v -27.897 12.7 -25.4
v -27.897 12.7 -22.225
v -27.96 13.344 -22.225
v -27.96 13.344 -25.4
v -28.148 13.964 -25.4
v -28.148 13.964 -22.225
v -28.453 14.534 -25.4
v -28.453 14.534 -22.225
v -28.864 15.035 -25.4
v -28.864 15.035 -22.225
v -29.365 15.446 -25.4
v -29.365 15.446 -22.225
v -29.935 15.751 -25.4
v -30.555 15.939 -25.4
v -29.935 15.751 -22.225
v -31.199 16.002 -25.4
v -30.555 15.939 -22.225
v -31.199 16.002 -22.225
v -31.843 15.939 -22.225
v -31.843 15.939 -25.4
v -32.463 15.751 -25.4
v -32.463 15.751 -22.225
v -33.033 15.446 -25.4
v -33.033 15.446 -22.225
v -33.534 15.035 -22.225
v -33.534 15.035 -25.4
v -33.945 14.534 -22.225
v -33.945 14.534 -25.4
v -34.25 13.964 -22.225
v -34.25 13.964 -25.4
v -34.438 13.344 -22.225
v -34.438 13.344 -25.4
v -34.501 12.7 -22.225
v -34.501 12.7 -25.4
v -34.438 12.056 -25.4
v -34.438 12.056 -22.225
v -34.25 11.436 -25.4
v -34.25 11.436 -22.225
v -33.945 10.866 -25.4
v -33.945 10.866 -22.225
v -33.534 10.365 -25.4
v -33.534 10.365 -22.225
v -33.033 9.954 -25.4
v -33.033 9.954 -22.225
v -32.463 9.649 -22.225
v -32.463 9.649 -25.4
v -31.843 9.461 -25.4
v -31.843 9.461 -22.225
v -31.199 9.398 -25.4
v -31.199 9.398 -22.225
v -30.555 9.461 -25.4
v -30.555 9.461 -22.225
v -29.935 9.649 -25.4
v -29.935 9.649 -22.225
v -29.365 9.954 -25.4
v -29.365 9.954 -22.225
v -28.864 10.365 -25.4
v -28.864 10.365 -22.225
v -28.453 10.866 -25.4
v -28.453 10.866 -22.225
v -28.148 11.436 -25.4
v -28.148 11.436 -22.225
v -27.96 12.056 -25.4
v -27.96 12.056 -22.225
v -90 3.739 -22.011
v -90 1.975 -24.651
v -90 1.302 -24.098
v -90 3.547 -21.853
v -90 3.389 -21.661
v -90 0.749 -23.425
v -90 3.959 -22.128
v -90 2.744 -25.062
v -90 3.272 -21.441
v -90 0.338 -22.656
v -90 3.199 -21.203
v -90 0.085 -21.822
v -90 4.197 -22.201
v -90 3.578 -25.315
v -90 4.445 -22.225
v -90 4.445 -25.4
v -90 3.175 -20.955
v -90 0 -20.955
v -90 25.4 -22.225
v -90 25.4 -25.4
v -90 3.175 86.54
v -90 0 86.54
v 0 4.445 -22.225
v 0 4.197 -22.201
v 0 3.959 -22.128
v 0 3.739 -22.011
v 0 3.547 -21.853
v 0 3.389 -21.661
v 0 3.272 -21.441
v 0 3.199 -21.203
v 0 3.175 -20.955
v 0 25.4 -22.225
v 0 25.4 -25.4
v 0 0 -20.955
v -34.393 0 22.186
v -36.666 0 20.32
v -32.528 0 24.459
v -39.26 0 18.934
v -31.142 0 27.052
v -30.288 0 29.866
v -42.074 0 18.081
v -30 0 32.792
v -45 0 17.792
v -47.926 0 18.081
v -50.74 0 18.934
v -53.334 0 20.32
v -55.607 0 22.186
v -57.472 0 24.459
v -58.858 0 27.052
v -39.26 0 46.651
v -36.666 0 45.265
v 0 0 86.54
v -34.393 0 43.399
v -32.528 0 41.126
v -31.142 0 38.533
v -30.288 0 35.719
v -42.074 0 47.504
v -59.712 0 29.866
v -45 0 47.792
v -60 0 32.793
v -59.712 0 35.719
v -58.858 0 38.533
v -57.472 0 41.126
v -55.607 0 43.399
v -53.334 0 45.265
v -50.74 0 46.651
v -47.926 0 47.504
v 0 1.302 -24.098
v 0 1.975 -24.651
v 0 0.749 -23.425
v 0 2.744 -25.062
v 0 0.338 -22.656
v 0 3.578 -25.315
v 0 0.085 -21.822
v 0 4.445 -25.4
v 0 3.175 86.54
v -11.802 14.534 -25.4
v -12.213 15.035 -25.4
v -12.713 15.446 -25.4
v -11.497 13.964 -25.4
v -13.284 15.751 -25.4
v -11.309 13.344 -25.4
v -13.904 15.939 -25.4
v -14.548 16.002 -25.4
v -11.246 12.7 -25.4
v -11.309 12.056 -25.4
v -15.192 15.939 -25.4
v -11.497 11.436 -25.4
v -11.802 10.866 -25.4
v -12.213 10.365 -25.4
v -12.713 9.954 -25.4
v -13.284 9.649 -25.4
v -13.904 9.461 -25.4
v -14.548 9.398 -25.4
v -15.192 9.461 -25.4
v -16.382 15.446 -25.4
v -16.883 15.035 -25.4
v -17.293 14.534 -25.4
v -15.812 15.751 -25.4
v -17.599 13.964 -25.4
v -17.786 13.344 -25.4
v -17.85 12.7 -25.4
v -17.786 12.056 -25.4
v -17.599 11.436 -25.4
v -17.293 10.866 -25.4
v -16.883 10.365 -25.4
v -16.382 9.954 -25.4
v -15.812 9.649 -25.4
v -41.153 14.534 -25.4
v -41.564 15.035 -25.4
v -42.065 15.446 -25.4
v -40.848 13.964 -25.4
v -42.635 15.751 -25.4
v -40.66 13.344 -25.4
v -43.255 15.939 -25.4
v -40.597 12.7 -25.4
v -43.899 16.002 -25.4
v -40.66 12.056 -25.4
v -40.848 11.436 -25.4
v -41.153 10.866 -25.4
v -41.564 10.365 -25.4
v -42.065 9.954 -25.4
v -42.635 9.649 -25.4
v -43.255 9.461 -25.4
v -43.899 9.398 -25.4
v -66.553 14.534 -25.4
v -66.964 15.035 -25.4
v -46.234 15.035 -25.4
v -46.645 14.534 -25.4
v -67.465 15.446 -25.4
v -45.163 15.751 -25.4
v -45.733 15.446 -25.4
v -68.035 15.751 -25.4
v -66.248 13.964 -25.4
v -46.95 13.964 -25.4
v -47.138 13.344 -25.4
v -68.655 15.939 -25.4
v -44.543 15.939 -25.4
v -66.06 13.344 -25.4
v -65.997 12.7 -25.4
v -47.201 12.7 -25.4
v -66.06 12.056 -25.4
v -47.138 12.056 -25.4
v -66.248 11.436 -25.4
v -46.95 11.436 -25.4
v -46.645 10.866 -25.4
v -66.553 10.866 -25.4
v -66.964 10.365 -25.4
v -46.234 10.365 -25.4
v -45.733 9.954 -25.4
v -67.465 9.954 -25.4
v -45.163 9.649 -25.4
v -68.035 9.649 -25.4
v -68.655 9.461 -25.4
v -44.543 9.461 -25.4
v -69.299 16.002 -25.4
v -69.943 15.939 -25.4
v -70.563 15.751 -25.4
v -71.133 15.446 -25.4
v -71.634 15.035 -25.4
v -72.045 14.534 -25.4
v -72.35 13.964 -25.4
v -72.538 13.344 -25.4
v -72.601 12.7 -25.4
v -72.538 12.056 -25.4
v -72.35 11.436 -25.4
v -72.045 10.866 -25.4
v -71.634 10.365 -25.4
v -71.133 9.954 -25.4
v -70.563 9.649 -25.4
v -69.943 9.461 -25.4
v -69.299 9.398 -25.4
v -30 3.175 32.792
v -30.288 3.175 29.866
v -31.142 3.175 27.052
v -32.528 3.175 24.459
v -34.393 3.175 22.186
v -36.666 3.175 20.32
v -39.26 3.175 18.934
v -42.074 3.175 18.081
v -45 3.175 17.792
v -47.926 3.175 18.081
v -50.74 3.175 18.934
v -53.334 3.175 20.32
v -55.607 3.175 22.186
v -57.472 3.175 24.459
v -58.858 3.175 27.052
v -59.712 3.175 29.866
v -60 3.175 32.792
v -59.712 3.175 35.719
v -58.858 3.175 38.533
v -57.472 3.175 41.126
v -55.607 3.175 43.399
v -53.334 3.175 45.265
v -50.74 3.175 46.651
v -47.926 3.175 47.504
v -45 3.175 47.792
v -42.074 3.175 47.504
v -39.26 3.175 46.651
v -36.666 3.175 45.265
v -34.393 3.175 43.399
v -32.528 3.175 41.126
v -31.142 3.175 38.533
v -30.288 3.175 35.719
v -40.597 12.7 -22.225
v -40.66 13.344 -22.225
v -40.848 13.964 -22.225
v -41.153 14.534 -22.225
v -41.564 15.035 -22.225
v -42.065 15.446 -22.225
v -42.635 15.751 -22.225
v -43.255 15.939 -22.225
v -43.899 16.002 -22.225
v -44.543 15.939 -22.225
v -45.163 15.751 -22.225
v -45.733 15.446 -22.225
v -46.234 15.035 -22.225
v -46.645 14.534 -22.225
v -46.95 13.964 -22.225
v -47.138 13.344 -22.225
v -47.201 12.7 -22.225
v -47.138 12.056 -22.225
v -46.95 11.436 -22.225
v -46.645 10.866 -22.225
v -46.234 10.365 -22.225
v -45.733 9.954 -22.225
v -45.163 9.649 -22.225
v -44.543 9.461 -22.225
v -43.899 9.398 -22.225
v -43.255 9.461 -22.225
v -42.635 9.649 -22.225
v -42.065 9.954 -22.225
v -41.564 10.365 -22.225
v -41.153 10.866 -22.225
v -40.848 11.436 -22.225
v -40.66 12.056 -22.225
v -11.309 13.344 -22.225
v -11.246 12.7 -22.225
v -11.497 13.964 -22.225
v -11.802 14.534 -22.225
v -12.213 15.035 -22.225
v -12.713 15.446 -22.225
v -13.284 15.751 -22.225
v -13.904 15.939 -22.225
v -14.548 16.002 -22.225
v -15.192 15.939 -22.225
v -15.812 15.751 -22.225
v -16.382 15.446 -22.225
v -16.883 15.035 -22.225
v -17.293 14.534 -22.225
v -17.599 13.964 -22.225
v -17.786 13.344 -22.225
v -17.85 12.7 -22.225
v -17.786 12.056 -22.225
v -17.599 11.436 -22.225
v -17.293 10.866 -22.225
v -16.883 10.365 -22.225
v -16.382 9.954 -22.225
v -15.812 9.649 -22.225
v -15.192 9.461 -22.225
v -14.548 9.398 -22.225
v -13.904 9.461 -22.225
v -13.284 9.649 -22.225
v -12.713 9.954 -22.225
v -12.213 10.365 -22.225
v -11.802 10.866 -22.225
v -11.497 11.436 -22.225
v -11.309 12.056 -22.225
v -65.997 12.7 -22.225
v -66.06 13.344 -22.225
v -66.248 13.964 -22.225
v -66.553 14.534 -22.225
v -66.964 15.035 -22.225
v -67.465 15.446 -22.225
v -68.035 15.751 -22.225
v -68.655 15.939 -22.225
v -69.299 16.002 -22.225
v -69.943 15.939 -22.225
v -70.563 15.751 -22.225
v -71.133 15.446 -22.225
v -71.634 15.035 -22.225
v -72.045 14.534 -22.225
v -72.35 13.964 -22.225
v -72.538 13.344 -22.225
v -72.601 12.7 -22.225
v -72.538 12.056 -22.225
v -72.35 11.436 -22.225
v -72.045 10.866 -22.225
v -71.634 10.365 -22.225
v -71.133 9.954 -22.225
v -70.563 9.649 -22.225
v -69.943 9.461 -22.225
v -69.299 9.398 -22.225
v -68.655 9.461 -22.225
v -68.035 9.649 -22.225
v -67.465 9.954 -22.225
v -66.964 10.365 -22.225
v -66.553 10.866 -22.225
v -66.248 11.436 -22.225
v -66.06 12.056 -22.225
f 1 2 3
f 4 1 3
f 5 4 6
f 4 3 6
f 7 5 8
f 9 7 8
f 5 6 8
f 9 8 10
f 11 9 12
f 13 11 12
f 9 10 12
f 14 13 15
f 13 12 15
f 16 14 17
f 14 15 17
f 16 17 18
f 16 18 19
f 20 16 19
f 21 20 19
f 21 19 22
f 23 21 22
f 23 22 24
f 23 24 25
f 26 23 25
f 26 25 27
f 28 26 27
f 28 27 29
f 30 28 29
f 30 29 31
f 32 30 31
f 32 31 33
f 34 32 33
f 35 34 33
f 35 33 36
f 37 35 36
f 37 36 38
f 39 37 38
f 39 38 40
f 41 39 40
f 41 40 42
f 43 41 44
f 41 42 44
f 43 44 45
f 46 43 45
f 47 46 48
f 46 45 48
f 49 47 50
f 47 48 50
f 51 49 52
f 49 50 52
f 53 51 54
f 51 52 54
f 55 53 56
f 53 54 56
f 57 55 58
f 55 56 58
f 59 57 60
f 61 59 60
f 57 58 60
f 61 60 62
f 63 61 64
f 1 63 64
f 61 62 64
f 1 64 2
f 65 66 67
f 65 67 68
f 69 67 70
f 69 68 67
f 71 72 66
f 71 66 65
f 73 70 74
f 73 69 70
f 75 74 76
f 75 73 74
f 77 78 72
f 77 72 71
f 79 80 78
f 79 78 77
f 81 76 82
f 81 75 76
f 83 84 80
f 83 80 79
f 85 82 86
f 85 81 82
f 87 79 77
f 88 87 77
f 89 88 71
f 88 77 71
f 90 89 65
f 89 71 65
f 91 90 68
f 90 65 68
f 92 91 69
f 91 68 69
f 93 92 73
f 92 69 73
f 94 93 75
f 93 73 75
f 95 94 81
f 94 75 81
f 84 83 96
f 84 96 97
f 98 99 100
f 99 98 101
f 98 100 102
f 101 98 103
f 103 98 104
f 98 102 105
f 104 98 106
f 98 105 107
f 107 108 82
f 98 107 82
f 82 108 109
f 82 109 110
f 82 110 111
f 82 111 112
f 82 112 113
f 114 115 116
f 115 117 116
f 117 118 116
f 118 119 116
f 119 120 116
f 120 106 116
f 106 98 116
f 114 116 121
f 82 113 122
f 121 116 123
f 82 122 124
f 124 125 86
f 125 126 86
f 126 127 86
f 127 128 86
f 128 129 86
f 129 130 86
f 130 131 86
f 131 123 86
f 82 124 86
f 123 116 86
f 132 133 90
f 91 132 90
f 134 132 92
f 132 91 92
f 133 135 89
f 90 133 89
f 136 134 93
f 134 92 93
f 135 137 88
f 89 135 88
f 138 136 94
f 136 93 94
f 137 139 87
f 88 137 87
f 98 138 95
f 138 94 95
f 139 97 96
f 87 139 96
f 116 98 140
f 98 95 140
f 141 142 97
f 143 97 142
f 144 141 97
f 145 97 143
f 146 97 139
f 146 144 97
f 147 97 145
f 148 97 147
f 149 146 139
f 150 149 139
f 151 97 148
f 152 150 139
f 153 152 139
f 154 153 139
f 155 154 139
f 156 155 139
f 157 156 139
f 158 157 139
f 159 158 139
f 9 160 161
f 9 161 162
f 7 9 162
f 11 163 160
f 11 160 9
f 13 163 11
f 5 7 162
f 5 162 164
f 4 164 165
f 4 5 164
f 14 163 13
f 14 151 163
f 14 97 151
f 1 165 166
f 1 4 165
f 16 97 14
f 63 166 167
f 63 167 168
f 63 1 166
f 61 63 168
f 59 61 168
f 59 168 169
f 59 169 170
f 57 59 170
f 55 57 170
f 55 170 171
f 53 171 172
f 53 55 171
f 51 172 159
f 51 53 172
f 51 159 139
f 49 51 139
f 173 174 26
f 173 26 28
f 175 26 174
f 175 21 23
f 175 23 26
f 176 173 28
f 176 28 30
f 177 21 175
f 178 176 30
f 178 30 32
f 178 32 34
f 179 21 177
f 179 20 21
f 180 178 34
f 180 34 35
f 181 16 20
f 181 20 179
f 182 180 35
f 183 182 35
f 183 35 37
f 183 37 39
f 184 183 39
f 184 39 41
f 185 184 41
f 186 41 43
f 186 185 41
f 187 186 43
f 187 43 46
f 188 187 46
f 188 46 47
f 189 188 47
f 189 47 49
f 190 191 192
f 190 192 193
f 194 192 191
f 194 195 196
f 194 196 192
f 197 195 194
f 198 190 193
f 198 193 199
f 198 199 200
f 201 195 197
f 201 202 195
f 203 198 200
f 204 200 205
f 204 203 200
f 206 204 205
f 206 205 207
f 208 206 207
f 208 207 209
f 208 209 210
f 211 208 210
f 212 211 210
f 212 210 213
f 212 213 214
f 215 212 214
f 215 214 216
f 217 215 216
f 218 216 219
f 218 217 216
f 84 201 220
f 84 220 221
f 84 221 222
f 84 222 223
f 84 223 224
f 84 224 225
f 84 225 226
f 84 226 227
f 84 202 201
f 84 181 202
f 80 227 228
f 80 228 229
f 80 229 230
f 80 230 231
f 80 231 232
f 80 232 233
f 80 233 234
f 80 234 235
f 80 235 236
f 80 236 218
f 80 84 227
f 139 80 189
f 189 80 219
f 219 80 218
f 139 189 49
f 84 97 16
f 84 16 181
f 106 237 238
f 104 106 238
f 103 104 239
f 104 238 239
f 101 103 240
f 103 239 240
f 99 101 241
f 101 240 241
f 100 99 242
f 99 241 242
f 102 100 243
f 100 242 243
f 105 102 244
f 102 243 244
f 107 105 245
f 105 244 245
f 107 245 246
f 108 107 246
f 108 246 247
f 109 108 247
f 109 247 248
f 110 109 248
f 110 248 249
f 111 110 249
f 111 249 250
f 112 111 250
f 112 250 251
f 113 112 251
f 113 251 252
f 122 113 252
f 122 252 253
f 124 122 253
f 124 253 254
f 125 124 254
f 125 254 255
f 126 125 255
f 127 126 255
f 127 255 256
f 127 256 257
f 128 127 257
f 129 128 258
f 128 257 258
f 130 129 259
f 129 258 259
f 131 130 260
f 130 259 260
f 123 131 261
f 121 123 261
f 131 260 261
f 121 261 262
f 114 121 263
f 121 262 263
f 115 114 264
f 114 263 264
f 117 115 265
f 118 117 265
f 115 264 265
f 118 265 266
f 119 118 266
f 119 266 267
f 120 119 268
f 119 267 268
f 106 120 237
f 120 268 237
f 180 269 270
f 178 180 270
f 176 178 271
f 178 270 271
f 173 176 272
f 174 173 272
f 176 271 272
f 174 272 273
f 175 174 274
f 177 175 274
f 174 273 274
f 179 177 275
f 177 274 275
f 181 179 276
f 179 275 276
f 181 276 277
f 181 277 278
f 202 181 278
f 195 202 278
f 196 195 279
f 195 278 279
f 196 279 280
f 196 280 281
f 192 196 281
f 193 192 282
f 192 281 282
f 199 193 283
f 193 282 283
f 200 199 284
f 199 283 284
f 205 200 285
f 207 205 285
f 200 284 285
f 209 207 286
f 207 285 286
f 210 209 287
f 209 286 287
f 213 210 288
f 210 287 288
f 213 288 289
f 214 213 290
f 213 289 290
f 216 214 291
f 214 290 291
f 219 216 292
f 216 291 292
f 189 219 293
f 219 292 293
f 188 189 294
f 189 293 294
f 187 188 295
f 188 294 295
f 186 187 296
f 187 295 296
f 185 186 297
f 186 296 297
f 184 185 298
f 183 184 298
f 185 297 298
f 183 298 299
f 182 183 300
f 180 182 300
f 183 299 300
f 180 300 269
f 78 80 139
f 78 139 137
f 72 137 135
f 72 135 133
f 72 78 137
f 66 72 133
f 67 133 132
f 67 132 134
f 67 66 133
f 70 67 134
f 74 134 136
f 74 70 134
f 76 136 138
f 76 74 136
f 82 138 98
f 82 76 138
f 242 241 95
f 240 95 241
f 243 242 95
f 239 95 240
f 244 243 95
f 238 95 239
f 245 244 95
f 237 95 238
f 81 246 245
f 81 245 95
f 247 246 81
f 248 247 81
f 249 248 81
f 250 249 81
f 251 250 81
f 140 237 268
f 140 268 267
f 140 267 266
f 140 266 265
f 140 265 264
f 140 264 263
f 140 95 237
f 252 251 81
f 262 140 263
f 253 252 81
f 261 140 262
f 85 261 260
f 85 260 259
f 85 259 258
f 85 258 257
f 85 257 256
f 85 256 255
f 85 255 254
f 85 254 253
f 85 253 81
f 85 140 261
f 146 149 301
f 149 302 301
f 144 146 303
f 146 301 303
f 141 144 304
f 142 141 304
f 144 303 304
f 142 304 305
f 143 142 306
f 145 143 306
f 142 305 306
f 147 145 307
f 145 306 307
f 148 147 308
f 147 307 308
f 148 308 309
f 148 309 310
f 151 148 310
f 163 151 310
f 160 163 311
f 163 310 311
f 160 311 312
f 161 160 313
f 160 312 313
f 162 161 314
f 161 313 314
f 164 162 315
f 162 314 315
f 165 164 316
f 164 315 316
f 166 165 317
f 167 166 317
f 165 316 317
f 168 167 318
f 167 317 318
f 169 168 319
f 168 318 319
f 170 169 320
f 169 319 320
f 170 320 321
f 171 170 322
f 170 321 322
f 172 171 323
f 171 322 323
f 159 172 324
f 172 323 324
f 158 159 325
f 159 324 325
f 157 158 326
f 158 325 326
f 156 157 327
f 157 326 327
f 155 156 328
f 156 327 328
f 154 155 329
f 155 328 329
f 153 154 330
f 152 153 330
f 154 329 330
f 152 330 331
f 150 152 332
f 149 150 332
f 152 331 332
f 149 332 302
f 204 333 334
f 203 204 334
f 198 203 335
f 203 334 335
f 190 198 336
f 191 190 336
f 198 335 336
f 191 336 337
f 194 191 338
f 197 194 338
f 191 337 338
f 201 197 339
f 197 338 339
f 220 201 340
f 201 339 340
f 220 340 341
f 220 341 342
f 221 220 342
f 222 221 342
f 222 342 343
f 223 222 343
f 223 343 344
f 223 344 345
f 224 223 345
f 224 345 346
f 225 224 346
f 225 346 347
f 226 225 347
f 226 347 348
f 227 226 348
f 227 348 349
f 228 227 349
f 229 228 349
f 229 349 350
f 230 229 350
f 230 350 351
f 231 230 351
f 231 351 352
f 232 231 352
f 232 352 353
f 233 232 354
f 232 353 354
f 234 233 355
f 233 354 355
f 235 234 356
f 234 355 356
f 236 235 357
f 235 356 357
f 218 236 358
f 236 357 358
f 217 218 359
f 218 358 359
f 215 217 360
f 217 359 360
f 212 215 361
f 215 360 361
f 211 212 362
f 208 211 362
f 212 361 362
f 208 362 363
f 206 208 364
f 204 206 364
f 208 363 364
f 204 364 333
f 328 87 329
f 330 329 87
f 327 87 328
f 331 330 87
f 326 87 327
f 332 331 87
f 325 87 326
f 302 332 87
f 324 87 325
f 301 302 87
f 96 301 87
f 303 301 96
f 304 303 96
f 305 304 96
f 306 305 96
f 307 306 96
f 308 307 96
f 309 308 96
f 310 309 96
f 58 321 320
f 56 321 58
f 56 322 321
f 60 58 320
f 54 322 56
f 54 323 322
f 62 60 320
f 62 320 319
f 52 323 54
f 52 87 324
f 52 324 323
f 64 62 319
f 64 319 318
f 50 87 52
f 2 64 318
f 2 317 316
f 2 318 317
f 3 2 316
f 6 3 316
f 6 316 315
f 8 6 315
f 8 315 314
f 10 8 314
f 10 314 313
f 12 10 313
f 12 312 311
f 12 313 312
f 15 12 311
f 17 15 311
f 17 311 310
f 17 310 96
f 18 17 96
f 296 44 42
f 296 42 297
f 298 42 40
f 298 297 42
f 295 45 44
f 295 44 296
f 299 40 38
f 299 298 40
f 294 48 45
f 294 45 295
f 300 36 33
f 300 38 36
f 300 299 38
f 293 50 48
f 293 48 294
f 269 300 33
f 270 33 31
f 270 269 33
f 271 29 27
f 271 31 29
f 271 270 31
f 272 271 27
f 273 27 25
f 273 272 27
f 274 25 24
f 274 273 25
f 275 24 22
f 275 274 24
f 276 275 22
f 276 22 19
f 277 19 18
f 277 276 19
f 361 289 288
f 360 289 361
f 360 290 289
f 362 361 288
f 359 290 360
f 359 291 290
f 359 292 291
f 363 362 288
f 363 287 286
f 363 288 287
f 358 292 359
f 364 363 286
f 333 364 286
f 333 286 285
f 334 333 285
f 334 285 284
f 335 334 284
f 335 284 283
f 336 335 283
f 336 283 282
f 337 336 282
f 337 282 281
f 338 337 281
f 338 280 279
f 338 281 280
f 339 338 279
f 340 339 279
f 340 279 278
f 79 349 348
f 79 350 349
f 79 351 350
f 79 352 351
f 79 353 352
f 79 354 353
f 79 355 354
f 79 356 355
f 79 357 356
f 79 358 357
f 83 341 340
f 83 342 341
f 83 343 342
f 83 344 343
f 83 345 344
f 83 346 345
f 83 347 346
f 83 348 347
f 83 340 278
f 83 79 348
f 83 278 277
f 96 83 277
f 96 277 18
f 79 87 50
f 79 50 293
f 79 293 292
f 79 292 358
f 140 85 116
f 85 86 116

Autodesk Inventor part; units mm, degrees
ref_plane "YZ Plane" through (0, 0, 0) normal (1, 0, 0) x (0, 1, 0)
ref_plane "XZ Plane" through (0, 0, 0) normal (0, 1, 0) x (-1, 0, 0)
ref_plane "XY Plane" through (0, 0, 0) normal (0, 0, 1) x (1, 0, 0)
sketch "Sketch3" plane through (0, 0, 0) normal (0, 1, 0) x (-1, 0, 0)
  line L0 (0, 0) -> (90, 0)
  line L1 (90, 0) -> (90, 86.54)
  line L2 (90, 86.54) -> (0, 86.54)
  line L3 (0, 86.54) -> (0, 0)
  line L4 (0, 0) -> (0, -25.4)
  line L5 (0, -25.4) -> (90, -25.4)
  line L6 (90, -25.4) -> (90, 0)
  dimension "d13" = 90
  dimension "d14" = 86.54
  dimension "d15" = 25.4
extrude "Plate3" add sketch "Sketch3" along normal blind 3.175
sketch "Sketch4" plane through (-90, 0, -22.225) normal (0, 0, -1) x (-1, 0, 0)
  line L0 (-90, 0) -> (0, 0)
  line L1 (0, 0) -> (0, 25.4)
  line L2 (0, 25.4) -> (-90, 25.4)
  line L3 (-90, 25.4) -> (-90, 0)
edge flange "Flange2" height 25.4 angle 90 thickness 3.175 bend radius 1.27 thickness toward (0, 0, -1) relief tear relief width 3.175 relief depth 1.5875 edges at (-45, 3.175, -25.4) wall of the first edge with corners at (0, 0, -22.225) (-90, 0, -22.225) (-90, 25.4, -22.225) (0, 25.4, -22.225)
bend "Bend2"
corner "Corner2"
sketch "Sketch5" plane through (0, 3.175, 0) normal (0, 1, 0) x (1, 0, 0)
  line L0 (0, 20.955) -> (-90, 20.955) projected
  line L1 (-90, -86.54) -> (-90, 20.955) projected
  line L2 (0, -86.54) -> (-90, -86.54) projected
  line L3 (0, 20.955) -> (0, -86.54) projected
  line L4 (-45, 20.955) -> (-45, -86.54)
  line L5 (0, -32.7925) -> (-90, -32.7925)
  circle A0 centre (-45, -32.7925) radius 15
  point P0 (0, 0)
  dimension "d27" = 30
extrude "Cut1" cut sketch "Sketch5" against normal blind 3.175 contours A0 L5 L4 | L4 L5 A0 | A0 L4 L5 | L4 A0 L5
sketch "Sketch6" plane through (-90, 25.4, -22.225) normal (0, 0, 1) x (1, 0, 0)
  circle A0 centre (20.701, -12.7) radius 3.302 projected
  circle A1 centre (58.801, -12.7) radius 3.302 projected
  circle A2 centre (46.101, -12.7) radius 3.302 projected
  circle A3 centre (1.651, -12.7) radius 3.302 projected
  circle A4 centre (119.9021, -12.7) radius 3.302 projected
  circle A5 centre (75.4521, -12.7) radius 3.302 projected
  point P0 (90, -25.4)
extrude "Cut2" cut sketch "Sketch6" against normal blind 3.175 contours A0 | A1 | A2 | A5
equation "\"d28\" = Thickness"
equation "\"d30\" = Thickness"
equation "\"d17\" = BendReliefWidth"
equation "\"d18\" = BendReliefDepth"
equation "\"d19\" = MinimumRemnant"
equation "\"d20\" = BendRadius"
equation "\"d24\" = CornerReliefSize"
equation "\"d25\" = GapSize"
equation "\"d26\" = JacobiRadiusSize"
equation "\"BendRadius\" = Thickness"
equation "\"BendReliefWidth\" = Thickness"
equation "\"BendReliefDepth\" = 0.5 * Thickness"
equation "\"CornerReliefSize\" = 4 * Thickness"
equation "\"MinimumRemnant\" = 2 * Thickness"
equation "\"TransitionRadius\" = BendRadius"
equation "\"JacobiRadiusSize\" = BendRadius"
equation "\"GapSize\" = Thickness"
equation "\"d2\" = BendRadius"
equation "\"d16\" = BendRadius"
equation "\"Thickness\" = 3.175"
properties part number "New Bracket for arm motor"
